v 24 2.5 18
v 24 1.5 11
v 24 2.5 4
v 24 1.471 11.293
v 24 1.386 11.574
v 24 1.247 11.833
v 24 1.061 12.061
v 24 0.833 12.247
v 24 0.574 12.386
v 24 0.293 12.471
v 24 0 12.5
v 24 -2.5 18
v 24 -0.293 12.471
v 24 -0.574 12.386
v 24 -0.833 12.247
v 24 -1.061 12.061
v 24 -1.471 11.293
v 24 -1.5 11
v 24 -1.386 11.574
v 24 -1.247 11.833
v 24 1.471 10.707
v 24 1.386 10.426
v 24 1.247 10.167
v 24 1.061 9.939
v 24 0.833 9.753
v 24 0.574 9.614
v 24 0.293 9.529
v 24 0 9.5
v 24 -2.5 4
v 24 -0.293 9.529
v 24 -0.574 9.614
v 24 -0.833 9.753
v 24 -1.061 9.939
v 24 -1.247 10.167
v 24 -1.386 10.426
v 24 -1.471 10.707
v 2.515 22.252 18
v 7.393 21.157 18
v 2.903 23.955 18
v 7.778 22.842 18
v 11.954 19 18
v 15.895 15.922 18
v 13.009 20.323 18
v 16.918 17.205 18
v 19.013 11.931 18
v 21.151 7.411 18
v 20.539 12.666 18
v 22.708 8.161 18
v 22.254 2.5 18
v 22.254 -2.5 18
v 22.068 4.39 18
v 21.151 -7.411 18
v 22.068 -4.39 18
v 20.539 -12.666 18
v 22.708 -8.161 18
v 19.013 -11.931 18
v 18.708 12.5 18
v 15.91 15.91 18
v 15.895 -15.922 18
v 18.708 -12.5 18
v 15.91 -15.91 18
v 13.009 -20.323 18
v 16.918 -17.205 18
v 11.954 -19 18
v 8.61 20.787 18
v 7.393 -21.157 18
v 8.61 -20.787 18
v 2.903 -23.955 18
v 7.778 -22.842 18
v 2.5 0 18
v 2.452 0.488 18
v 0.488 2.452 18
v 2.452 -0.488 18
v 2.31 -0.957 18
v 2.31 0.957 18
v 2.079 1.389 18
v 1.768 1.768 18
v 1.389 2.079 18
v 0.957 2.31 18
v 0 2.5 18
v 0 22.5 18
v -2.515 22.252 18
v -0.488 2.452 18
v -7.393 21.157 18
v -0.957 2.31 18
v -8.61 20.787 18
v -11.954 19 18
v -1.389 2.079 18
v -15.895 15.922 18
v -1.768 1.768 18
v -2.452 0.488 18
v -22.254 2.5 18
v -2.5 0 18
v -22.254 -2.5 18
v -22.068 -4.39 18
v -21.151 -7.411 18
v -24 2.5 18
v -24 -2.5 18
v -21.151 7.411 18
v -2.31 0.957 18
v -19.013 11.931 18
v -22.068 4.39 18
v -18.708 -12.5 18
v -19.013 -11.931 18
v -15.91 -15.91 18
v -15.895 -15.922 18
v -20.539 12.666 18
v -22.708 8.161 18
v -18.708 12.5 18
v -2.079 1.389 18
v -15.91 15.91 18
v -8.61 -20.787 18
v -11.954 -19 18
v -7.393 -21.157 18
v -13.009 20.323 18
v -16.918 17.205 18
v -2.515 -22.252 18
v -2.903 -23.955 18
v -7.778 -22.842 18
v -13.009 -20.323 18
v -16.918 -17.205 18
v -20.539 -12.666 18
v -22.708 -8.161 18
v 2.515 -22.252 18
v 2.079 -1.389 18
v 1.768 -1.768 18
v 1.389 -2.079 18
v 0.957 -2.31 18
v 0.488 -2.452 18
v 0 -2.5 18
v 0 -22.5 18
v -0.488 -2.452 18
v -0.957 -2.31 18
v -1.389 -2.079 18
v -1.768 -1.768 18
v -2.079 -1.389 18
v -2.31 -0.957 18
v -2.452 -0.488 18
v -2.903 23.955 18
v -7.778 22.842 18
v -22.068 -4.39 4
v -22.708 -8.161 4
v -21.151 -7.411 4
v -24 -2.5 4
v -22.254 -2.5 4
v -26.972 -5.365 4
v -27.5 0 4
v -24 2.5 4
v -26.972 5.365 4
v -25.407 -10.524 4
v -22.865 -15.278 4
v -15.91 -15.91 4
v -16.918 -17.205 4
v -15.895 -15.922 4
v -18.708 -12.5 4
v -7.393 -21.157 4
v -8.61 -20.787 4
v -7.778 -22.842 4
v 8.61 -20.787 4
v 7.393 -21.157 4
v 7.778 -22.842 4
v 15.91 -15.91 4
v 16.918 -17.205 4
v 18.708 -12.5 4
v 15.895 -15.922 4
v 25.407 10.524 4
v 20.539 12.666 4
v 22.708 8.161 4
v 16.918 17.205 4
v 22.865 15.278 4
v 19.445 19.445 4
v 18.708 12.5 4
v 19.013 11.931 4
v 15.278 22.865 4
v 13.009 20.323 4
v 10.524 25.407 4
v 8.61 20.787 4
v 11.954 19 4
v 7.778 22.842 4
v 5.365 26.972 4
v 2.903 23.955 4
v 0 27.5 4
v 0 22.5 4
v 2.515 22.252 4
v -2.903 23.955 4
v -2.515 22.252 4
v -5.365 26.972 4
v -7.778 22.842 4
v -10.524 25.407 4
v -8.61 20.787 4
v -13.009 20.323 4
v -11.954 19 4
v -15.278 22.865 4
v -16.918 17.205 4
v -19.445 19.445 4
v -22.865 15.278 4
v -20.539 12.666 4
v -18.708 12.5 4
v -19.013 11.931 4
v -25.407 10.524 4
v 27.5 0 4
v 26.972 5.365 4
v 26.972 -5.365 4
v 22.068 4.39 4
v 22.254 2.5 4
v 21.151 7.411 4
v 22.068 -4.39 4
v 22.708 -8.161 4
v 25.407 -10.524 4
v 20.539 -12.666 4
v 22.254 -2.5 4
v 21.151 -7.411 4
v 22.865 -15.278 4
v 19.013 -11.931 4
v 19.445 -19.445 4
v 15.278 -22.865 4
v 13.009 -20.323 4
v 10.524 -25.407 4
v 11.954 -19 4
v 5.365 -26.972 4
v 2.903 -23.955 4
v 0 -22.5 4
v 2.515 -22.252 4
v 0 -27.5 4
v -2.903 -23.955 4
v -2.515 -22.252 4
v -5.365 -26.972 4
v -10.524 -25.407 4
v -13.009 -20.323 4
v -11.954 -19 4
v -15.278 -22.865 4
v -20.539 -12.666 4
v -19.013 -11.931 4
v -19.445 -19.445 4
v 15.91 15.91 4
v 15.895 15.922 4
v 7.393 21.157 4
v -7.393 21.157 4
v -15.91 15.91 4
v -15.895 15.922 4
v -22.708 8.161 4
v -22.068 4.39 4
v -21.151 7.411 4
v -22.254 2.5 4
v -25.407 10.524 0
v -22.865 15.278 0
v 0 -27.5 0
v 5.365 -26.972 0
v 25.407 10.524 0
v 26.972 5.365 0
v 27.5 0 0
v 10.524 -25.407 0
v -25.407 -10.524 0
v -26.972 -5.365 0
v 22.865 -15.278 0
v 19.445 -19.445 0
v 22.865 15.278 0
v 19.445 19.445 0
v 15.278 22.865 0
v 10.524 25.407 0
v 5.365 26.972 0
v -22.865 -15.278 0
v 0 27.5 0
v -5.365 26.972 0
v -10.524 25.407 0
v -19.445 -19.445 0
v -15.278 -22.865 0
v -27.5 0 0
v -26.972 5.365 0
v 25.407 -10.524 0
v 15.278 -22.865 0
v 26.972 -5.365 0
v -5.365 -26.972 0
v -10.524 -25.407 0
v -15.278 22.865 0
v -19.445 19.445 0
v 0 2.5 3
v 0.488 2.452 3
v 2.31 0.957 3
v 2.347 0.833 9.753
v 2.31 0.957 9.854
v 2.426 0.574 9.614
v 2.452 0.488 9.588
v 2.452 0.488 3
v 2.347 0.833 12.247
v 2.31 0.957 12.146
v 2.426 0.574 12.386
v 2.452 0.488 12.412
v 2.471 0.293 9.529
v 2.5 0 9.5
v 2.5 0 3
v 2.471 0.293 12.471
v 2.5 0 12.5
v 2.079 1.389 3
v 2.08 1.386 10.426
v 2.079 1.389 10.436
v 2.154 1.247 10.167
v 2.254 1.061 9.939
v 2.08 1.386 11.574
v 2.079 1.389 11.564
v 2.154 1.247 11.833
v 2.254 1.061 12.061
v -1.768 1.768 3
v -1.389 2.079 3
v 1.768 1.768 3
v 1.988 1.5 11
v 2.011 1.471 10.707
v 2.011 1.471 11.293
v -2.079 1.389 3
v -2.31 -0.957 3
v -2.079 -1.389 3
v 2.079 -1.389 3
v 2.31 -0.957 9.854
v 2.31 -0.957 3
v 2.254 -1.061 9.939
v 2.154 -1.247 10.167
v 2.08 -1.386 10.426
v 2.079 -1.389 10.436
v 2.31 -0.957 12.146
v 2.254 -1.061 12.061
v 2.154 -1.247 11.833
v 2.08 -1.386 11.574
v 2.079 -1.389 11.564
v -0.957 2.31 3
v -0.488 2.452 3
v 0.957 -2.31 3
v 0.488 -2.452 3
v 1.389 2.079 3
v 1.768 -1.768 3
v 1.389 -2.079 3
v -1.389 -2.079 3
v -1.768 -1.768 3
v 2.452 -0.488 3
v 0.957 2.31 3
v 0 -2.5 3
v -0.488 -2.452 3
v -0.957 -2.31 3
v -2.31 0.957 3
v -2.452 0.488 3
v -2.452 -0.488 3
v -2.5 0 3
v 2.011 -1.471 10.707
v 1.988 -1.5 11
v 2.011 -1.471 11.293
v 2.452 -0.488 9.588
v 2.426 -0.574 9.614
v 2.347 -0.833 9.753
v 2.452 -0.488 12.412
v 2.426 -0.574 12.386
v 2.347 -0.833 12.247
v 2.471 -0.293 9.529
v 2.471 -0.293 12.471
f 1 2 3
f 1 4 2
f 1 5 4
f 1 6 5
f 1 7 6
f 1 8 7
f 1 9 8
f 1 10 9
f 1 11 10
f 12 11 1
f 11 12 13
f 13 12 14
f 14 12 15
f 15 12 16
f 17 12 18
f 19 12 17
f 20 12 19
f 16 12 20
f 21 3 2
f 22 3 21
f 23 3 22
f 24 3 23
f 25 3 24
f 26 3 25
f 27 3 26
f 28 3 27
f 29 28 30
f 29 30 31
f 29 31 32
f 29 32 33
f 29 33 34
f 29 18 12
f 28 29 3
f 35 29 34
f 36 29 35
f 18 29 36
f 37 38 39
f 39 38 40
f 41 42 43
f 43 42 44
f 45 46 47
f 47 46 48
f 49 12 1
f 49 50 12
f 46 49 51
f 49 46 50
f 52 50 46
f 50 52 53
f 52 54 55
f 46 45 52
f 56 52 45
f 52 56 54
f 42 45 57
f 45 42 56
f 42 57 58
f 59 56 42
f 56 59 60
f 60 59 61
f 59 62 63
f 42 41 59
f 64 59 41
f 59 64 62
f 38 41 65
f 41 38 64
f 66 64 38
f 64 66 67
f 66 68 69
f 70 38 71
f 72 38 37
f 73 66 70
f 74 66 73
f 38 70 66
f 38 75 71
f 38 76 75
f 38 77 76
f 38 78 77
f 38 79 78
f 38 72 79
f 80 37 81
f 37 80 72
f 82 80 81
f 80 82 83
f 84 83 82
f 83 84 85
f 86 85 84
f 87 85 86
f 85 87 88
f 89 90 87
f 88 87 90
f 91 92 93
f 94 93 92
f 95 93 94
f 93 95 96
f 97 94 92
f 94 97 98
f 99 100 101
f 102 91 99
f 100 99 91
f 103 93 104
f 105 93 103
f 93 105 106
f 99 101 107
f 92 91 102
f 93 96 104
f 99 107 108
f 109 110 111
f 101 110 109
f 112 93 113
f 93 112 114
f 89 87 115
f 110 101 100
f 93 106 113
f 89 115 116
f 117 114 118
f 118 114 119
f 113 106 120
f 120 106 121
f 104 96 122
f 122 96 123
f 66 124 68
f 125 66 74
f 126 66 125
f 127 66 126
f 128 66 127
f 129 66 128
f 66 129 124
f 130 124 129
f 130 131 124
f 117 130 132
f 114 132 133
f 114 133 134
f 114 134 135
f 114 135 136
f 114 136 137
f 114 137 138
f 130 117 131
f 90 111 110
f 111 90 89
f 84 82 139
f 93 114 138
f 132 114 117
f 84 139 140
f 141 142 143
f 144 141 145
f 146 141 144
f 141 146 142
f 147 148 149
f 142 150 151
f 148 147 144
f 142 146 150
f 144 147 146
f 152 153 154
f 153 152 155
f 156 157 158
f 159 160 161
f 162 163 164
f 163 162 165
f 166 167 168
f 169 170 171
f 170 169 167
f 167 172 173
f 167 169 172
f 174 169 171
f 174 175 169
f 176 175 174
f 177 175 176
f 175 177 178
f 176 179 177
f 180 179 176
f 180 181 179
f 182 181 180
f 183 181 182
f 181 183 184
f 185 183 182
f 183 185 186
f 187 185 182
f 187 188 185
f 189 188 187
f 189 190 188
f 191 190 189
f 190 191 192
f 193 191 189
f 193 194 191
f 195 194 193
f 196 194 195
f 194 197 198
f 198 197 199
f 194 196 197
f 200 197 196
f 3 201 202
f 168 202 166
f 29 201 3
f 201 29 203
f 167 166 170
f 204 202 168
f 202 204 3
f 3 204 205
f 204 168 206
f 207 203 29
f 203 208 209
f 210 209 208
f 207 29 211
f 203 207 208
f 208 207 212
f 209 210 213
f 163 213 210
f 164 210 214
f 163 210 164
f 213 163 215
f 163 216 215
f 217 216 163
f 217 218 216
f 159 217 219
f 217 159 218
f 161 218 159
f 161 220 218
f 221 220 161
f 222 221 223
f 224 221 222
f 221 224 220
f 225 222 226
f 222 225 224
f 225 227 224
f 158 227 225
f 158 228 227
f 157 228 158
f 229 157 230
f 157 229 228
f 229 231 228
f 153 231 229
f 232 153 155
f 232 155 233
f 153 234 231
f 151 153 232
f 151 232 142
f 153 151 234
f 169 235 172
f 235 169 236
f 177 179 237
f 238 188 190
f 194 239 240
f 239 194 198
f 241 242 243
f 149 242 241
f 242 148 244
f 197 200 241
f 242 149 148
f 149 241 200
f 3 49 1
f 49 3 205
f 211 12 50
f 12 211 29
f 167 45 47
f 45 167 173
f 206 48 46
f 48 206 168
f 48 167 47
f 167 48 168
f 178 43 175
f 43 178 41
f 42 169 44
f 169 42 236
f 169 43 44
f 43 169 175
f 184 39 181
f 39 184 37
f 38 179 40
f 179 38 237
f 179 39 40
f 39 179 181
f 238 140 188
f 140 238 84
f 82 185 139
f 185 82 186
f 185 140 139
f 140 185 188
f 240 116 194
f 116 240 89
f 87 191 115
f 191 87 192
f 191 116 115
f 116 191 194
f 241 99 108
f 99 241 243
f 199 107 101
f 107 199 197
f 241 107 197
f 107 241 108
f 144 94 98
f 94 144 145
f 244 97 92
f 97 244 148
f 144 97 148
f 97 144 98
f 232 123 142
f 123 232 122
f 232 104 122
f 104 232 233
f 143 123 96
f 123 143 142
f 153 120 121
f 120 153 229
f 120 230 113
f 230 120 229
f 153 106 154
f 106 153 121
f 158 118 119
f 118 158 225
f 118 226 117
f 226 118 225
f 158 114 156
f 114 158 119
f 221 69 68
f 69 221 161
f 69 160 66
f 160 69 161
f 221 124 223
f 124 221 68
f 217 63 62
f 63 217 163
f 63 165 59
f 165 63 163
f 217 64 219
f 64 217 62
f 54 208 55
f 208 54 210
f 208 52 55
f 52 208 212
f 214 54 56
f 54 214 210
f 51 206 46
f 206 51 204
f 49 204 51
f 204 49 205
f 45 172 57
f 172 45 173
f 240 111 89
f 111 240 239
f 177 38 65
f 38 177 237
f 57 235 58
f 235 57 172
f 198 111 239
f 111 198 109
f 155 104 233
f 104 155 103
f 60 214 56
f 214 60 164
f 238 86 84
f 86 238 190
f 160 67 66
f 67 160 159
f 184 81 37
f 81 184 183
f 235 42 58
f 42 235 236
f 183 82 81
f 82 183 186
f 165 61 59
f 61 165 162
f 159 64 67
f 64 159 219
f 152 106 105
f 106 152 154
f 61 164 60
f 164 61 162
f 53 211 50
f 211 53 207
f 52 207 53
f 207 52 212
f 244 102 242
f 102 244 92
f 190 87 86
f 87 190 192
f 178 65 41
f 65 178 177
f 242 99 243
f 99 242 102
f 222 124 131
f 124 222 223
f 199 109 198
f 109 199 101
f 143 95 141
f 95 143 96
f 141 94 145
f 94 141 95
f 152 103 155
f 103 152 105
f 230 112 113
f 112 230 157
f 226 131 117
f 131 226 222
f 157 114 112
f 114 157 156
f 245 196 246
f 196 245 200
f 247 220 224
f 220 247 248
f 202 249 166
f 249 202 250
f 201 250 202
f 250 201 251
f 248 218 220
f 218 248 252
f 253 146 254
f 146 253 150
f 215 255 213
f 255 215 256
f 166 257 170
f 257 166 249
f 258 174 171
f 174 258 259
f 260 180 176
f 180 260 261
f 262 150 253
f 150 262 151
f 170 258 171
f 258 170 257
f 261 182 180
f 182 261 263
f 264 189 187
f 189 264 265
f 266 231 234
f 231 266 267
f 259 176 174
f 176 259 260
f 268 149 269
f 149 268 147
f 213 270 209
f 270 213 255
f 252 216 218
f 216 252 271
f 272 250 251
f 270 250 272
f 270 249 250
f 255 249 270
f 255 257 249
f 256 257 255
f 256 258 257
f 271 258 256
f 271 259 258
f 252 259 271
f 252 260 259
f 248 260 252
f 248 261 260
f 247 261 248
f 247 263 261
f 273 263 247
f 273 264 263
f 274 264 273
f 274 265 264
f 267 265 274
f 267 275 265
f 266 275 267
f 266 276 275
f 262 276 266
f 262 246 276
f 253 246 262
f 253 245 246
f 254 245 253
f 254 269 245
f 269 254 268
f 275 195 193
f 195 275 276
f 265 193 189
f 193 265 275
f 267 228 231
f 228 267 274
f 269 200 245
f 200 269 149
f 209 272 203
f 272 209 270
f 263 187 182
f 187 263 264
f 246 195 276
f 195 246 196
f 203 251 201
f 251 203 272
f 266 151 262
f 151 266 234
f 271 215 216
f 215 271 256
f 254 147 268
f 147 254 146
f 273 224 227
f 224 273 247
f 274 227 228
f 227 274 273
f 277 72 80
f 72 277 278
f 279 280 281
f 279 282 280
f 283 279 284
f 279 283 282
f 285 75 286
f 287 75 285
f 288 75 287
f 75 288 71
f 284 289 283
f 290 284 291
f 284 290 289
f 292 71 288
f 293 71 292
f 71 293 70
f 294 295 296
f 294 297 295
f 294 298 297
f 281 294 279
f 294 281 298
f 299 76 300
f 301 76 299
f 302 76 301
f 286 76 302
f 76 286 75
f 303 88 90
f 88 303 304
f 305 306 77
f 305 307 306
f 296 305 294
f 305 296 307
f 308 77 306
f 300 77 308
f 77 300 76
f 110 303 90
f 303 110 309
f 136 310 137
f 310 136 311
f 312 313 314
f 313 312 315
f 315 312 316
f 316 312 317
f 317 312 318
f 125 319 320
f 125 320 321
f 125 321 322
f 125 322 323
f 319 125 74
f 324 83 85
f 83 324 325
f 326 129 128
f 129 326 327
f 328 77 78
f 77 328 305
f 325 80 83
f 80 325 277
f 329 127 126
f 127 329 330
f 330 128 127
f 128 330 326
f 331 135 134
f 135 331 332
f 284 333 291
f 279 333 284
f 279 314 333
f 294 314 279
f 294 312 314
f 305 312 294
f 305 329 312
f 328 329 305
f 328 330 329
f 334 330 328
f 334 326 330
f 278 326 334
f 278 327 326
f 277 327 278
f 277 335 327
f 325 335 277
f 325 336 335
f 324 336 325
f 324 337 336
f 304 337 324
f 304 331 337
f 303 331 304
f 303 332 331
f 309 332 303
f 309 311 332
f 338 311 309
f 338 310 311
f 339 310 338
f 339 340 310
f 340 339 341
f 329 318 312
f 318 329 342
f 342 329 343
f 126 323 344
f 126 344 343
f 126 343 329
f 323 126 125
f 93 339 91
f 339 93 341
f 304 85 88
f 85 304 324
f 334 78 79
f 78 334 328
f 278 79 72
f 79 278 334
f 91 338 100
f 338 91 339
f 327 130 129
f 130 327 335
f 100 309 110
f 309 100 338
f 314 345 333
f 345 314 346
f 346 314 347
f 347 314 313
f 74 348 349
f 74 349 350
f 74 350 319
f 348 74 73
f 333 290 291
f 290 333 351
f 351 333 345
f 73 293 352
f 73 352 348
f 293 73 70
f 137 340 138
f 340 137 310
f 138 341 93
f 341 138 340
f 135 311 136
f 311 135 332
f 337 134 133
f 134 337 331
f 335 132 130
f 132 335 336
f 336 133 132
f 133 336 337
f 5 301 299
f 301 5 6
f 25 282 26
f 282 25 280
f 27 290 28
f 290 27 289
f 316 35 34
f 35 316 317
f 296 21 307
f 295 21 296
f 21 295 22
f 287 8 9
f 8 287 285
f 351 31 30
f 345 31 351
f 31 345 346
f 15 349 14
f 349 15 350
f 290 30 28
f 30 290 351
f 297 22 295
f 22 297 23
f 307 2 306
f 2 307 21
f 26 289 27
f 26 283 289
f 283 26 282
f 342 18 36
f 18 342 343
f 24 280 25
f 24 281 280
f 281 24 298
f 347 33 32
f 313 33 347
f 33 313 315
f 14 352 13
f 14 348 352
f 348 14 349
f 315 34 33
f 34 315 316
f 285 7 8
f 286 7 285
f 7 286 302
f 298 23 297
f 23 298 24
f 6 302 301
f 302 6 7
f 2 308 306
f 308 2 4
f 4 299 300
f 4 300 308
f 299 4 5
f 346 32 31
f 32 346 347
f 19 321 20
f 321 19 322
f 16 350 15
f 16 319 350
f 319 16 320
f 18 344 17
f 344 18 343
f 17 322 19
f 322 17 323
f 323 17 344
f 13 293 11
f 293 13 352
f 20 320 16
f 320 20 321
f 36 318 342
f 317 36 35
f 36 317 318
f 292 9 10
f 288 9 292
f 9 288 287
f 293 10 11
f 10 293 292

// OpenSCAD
$fn = 32;

// ----------------------------------------------------------------------
// Control knob: skirt knob with grip ribs
// ----------------------------------------------------------------------

// --- parameters (mm) ---
skirt_d = 55;             // skirt diameter
skirt_t = 4;              // skirt thickness
rib_w = 5;                // grip rib width
rib_out = 2.5;            // grip rib radial protrusion
n_ribs = 14;              // number of grip ribs
knob_d = 45;              // knob body diameter
knob_h = 14;              // knob body height
bore_d = 5;               // shaft bore diameter
set_d = 3;                // set screw bore diameter

rib_step = 360 / n_ribs;  // rib angular step
total_h = skirt_t + knob_h;  // overall height

difference() {
  union() {
    translate([0, 0, skirt_t]) cylinder(h = knob_h, d = knob_d);
    cylinder(h = skirt_t, d = skirt_d);
    for (i = [0 : n_ribs - 1])
      rotate([0, 0, i * rib_step])
        translate([knob_d / 2 - 1, -rib_w / 2, skirt_t])
          cube([rib_out, rib_w, knob_h]);
  }
  translate([0, 0, skirt_t - 1]) cylinder(h = knob_h + 2, d = bore_d);
  translate([-1, 0, skirt_t + knob_h / 2]) rotate([0, 90, 0])
    cylinder(h = knob_d / 2 + bore_d / 2 + 2, d = set_d);
}
